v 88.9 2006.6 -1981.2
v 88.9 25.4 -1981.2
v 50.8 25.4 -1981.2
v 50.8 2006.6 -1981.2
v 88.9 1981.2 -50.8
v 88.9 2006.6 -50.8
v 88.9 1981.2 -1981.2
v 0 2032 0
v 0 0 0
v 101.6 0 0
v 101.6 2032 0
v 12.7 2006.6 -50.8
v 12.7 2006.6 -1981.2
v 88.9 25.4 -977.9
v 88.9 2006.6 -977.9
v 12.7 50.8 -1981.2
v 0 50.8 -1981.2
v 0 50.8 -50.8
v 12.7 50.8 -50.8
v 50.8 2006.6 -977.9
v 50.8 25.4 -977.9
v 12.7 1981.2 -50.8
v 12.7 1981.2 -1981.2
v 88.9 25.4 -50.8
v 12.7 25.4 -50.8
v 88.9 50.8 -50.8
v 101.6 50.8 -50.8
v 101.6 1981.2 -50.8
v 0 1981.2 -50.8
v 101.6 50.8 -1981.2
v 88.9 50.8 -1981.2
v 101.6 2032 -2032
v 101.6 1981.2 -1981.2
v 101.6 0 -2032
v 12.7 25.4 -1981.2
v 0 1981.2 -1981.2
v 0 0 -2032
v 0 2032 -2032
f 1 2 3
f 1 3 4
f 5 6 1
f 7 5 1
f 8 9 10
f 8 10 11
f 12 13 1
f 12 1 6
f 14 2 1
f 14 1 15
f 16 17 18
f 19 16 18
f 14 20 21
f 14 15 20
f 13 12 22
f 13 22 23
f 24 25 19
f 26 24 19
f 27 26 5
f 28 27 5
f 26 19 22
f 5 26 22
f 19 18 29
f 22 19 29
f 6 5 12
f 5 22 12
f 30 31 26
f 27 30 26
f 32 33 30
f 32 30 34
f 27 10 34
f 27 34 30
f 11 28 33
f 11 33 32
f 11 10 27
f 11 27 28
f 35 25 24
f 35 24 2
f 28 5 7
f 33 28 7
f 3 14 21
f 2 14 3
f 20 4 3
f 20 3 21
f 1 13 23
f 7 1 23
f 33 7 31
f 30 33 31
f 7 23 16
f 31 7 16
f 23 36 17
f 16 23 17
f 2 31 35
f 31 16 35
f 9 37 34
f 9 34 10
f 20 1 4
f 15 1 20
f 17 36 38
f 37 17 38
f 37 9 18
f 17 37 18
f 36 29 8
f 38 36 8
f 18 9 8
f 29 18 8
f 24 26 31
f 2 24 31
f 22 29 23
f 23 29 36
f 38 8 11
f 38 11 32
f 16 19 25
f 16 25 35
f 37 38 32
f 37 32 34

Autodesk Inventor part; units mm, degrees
ref_plane "YZ Plane" through (0, 0, 0) normal (1, 0, 0) x (0, 1, 0)
sketch "Sketch1" plane through (0, 0, 0) normal (1, 0, 0) x (0, 1, 0)
  line L0 (0, 0) -> (2032, 0)
  line L1 (2032, 0) -> (2032, -2032)
  line L2 (2032, -2032) -> (0, -2032)
  line L3 (0, -2032) -> (0, 0)
  line L4 (50.8, -50.8) -> (1981.2, -50.8)
  line L5 (1981.2, -50.8) -> (1981.2, -1981.2)
  line L6 (1981.2, -1981.2) -> (50.8, -1981.2)
  line L7 (50.8, -1981.2) -> (50.8, -50.8)
  point P0 (1981.2, -1016)
  point P1 (2032, -1016)
  point P2 (1016, -1981.2)
  point P3 (1016, -2032)
  dimension "d0" = 50.8
  dimension "d1" = 50.8
  dimension "d2" = 2032
  dimension "d3" = 2032
extrude "BaseFrame" add sketch "Sketch1" along normal blind 101.6
ref_plane "Work Plane1" through (50.8, 0, 0) normal (1, 0, 0) x (0, 0, -1)
sketch "Sketch2" plane through (50.8, 0, 0) normal (1, 0, 0) x (0, 0, -1)
  line L0 (0, 0) -> (0, 2032) construction
  line L1 (0, 2032) -> (2032, 2032) construction
  line L2 (2032, 2032) -> (2032, 0) construction
  line L3 (2032, 0) -> (0, 0) construction
  line L4 (2006.6, 2006.6) -> (25.4, 2006.6)
  line L5 (25.4, 2006.6) -> (25.4, 25.4) construction
  line L6 (25.4, 25.4) -> (2006.6, 25.4)
  line L7 (2006.6, 25.4) -> (2006.6, 2006.6) construction
  line L8 (1981.2, 50.8) -> (1981.2, 1981.2) projected
  line L9 (50.8, 1981.2) -> (50.8, 50.8) projected
  line L10 (50.8, 1981.2) -> (50.8, 2006.6)
  line L11 (1981.2, 1981.2) -> (1981.2, 2006.6)
  line L12 (1981.2, 50.8) -> (1981.2, 25.4)
  line L13 (50.8, 50.8) -> (50.8, 25.4)
  dimension "d6" = 25.4
extrude "DoorSlot" cut sketch "Sketch2" along normal mid plane 76.2
sketch "Sketch3" plane through (88.9, 0, 0) normal (-1, 0, 0) x (0, 0, 1)
  line L0 (-50.8, 25.4) -> (-1981.2, 25.4) projected
  line L1 (-1981.2, 2006.6) -> (-50.8, 2006.6) projected
  line L2 (-1981.2, 2006.6) -> (-977.9, 2006.6)
  line L3 (-977.9, 2006.6) -> (-977.9, 25.4)
  line L4 (-977.9, 25.4) -> (-1981.2, 25.4)
  line L5 (-1981.2, 25.4) -> (-1981.2, 2006.6)
  dimension "d9" = 1003.3
extrude "StationaryPanel" add sketch "Sketch3" along normal blind 38.1 separate body
ref_plane "Work Plane2" through (0, 0, -1016) normal (0, 0, 1) x (1, 0, 0)
mirror "MirrorRight" [suppressed]
mirror "MirrorRightExterior" [suppressed]
mirror "MirrorLeftExterior" [suppressed]
equation "\"d0\" = FrameWidth"
equation "\"d1\" = d0"
equation "\"d2\" = Width"
equation "\"d3\" = Height"
equation "\"d4\" = Depth"
equation "\"d6\" = 0.5 * FrameWidth"
equation "\"d7\" = 0.75 * Depth"
equation "\"d10\" = 0.375 * Depth"
equation "\"Width\" = 2032"
equation "\"Depth\" = 101.6"
equation "\"Height\" = 2032"
equation "\"FrameWidth\" = 50.8"
properties part number "AVADemo_SlidingDoorFrame"
